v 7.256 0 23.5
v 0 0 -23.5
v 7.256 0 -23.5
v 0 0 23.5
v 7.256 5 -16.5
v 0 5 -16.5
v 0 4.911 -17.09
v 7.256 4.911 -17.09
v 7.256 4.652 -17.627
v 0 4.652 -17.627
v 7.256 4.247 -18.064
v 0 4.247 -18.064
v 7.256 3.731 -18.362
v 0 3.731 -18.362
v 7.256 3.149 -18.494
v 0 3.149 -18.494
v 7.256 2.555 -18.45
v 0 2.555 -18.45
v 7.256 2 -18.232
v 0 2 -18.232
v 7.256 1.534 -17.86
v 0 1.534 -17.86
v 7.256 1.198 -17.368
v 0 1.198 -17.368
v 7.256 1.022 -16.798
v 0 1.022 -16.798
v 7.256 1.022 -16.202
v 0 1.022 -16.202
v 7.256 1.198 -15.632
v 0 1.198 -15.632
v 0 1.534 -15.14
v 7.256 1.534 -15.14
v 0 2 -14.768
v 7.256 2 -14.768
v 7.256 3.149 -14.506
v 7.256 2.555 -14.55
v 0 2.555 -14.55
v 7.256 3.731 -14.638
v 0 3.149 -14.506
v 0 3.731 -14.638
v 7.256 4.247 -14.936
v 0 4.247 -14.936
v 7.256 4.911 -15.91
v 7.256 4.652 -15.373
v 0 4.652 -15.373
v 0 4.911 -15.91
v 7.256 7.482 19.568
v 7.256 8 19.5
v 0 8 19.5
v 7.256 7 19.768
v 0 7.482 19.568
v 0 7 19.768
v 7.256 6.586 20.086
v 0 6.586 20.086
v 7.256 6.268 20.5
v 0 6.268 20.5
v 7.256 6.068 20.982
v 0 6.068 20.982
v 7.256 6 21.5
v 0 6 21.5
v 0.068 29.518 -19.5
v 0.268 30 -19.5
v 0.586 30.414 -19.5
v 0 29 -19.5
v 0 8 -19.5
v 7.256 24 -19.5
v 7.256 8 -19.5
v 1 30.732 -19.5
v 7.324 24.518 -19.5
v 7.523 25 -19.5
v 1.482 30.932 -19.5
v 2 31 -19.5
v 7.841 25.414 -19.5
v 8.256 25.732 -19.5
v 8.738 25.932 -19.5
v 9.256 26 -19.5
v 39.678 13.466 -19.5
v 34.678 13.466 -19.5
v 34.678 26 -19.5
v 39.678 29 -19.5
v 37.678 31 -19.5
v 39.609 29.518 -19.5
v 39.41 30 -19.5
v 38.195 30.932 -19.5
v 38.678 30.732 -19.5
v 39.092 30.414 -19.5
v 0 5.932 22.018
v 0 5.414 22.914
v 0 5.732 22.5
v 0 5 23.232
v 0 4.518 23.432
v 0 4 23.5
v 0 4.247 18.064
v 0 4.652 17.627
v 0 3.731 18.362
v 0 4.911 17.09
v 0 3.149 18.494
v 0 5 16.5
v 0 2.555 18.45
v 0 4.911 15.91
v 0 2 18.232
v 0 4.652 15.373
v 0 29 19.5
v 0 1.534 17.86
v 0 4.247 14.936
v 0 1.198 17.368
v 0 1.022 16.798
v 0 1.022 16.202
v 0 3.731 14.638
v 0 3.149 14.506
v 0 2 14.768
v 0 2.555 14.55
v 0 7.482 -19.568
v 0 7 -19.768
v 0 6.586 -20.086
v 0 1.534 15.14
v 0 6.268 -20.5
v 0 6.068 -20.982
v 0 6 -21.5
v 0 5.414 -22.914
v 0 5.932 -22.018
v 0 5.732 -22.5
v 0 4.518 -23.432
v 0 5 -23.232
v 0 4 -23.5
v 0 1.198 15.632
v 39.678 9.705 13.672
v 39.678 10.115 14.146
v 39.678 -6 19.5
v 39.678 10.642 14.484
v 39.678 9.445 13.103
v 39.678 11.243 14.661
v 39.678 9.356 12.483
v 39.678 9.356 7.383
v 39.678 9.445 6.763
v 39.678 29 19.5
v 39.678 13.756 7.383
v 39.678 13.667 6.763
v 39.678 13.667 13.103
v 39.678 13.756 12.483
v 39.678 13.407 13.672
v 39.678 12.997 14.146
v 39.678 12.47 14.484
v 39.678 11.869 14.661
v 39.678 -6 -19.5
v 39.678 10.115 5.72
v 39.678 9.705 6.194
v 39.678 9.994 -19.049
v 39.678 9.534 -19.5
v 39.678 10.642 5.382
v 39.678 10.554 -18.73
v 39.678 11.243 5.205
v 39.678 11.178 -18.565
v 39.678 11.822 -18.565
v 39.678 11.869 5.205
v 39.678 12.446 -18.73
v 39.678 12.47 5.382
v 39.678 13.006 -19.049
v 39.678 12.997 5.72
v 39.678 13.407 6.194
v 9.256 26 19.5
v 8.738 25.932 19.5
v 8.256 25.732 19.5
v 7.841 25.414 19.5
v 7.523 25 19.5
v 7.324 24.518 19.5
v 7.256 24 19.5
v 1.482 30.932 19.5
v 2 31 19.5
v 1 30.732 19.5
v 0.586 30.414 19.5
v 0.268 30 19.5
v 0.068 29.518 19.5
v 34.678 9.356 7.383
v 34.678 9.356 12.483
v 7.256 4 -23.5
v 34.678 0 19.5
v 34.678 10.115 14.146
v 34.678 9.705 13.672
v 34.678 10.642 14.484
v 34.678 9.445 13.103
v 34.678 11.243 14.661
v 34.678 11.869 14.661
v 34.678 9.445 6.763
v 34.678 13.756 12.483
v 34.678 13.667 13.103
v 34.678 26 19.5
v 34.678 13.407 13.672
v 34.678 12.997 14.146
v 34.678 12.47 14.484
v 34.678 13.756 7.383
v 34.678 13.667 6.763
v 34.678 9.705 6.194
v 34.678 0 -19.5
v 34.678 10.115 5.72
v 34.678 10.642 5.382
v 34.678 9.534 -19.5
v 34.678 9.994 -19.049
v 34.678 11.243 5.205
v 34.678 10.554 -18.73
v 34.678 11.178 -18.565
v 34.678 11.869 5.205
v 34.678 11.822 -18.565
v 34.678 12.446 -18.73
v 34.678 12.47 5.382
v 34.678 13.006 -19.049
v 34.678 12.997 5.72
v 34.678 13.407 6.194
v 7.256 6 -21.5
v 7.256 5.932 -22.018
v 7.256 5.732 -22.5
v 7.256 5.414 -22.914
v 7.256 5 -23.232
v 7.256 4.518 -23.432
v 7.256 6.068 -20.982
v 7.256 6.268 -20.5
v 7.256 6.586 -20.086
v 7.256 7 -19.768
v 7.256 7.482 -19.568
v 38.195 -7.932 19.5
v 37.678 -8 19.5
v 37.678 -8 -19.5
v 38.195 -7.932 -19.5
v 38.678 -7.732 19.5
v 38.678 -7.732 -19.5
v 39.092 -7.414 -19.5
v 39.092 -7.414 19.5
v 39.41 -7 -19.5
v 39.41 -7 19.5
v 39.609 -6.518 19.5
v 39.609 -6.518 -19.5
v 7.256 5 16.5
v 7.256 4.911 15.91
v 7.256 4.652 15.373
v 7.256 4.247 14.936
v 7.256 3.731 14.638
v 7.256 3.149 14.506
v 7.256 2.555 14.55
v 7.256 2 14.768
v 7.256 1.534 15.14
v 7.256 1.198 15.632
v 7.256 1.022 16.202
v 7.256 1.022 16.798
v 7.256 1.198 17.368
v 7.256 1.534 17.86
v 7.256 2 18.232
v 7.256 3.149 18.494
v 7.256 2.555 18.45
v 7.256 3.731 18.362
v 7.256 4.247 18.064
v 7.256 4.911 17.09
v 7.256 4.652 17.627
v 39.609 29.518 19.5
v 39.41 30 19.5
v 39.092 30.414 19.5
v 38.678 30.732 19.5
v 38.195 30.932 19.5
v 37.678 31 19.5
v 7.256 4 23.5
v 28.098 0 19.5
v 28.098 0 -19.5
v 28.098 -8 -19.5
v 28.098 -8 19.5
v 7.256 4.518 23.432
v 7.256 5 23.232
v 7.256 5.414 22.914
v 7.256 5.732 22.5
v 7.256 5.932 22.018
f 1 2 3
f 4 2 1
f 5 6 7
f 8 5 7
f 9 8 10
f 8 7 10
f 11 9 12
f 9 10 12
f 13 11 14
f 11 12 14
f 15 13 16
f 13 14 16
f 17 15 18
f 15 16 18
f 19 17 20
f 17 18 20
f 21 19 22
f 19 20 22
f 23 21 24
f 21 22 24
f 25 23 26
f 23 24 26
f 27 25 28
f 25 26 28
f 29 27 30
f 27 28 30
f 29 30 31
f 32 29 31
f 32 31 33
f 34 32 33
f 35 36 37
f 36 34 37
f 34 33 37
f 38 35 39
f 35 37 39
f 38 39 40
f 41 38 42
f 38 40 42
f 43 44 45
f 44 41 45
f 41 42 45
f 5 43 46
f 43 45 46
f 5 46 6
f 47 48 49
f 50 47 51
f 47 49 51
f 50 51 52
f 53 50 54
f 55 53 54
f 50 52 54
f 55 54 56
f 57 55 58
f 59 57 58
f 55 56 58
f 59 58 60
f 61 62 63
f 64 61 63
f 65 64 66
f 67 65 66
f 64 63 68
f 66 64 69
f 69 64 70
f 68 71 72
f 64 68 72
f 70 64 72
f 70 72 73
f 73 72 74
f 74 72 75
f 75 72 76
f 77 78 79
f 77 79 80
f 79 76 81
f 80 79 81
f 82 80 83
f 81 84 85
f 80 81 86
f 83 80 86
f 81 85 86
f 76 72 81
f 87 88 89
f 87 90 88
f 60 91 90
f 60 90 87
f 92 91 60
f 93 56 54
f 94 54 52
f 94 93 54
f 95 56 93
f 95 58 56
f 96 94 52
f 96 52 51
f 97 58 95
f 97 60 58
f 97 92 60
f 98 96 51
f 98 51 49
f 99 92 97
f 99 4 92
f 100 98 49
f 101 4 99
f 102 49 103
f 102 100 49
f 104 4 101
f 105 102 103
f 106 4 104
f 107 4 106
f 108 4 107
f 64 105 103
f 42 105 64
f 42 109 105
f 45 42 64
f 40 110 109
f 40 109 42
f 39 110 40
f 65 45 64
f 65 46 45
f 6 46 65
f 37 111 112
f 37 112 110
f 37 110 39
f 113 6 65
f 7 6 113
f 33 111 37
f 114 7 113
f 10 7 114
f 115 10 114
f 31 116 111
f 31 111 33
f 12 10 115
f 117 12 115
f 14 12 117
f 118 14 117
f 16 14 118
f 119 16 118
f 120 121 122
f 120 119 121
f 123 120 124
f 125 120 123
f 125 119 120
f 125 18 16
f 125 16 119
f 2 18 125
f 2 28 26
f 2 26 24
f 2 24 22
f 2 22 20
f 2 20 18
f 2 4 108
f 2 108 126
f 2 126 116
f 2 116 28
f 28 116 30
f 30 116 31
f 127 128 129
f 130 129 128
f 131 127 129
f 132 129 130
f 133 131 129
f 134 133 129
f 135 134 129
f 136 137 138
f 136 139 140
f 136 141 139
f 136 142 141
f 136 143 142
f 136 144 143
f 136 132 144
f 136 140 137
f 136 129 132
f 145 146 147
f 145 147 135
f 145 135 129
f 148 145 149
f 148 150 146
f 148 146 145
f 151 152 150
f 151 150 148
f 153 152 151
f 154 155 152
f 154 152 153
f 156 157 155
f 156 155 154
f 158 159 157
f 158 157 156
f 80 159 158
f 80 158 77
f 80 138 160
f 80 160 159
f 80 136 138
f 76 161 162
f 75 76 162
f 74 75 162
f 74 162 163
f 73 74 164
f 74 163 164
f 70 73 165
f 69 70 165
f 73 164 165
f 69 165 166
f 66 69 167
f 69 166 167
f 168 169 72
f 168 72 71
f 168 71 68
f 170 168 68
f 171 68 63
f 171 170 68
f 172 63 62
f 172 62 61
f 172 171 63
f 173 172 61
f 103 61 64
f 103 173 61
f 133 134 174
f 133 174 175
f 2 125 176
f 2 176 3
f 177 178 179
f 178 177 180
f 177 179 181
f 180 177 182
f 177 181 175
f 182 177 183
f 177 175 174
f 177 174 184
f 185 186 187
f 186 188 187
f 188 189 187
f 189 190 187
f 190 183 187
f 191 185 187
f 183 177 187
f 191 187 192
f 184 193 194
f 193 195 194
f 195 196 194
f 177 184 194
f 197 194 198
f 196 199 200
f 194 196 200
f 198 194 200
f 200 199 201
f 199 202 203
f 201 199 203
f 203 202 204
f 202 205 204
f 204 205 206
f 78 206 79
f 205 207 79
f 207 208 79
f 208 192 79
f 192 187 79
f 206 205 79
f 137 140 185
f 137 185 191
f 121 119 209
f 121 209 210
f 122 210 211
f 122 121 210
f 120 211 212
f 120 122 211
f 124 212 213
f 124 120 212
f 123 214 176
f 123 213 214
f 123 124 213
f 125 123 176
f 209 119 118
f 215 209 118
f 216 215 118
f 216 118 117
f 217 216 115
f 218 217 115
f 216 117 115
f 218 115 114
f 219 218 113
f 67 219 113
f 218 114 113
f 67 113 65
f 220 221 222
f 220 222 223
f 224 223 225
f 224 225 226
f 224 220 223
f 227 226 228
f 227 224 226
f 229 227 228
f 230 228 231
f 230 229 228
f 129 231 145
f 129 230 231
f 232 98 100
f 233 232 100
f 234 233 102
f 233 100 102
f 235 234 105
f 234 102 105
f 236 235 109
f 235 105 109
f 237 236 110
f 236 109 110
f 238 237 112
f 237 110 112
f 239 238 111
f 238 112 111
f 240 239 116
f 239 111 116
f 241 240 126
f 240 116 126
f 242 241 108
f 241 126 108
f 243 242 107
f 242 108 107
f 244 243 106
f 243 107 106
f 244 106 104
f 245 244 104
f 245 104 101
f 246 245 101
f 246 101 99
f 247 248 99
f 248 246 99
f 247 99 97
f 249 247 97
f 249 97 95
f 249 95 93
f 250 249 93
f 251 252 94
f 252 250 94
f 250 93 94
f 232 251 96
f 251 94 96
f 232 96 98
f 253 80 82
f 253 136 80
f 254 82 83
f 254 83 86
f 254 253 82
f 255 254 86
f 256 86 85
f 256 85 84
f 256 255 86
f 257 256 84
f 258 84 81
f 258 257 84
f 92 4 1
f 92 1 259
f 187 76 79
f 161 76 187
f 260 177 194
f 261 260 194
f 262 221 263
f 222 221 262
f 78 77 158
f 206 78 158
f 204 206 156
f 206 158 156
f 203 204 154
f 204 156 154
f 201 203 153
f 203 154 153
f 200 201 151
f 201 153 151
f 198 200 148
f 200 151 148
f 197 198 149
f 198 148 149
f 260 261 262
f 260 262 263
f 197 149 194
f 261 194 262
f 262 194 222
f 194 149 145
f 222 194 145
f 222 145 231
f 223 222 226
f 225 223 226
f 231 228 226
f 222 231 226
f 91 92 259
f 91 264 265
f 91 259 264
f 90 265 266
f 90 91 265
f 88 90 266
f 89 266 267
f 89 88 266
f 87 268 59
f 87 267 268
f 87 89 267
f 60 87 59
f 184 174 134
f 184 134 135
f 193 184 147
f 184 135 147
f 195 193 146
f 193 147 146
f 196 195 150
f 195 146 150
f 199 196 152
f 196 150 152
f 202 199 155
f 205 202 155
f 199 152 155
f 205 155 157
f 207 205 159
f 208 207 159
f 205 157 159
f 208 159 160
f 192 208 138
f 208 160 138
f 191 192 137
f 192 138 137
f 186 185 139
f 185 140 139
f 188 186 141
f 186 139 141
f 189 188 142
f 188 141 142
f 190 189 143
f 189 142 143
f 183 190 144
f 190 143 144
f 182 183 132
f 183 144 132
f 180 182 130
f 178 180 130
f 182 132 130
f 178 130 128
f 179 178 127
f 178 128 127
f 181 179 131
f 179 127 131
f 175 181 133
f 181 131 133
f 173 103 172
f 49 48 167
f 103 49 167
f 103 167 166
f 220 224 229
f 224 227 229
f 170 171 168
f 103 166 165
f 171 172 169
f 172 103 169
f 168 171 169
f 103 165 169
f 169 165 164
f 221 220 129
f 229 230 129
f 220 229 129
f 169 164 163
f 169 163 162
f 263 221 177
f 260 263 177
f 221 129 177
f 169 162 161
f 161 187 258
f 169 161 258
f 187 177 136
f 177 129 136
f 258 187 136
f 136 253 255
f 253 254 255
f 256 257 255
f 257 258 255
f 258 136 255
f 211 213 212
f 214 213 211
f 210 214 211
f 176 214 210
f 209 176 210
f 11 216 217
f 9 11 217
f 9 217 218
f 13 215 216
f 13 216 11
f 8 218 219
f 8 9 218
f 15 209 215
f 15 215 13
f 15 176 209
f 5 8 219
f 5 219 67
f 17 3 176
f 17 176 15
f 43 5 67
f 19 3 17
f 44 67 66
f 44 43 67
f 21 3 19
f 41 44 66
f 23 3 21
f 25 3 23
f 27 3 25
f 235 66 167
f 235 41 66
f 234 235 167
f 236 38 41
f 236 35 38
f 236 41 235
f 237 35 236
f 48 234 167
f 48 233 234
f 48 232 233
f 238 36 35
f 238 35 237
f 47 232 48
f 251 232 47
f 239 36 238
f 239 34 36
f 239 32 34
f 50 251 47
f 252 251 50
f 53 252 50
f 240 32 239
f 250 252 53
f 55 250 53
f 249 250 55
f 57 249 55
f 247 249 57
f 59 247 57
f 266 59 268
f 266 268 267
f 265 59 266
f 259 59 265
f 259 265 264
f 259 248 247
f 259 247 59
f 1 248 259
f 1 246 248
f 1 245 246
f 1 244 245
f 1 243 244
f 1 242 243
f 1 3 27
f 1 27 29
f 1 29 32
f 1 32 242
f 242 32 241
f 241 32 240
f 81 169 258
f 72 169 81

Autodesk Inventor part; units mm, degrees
ref_plane "YZ Plane" through (0, 0, 0) normal (1, 0, 0) x (0, 1, 0)
ref_plane "XZ Plane" through (0, 0, 0) normal (0, 1, 0) x (-1, 0, 0)
ref_plane "XY Plane" through (0, 0, 0) normal (0, 0, 1) x (1, 0, 0)
sketch "Sketch1" plane through (0, 0, 0) normal (1, 0, 0) x (0, 1, 0)
  line L0 (0, 0) -> (0, 23.5)
  line L1 (0, 23.5) -> (6, 23.5)
  line L2 (6, 23.5) -> (6, -23.5)
  line L3 (6, -23.5) -> (0, -23.5)
  line L4 (0, -23.5) -> (0, 0)
  line L5 (6, 23.5) -> (6, 21.5)
  line L6 (6, 21.5) -> (4, 21.5)
  circle A0 centre (4, 21.5) radius 2
  line L7 (6, -23.5) -> (6, -21.5)
  line L8 (6, -21.5) -> (4, -21.5)
  circle A1 centre (4, -21.5) radius 2
  line L9 (6, -23.5) -> (6, -16.5)
  line L10 (6, -16.5) -> (3, -16.5)
  line L11 (6, 23.5) -> (6, 16.5)
  line L12 (6, 16.5) -> (3, 16.5)
  circle A2 centre (3, 16.5) radius 2
  circle A3 centre (3, -16.5) radius 2
  point P0 (4, 23.5)
  point P1 (4, -23.5)
  dimension "d0" = 23.5
  dimension "d1" = 6
  dimension "d2" = 47
  dimension "d3" = 6
  dimension "d4" = 2
  dimension "d5" = 2
  dimension "d6" = 4
  dimension "d7" = 2
  dimension "d8" = 2
  dimension "d9" = 4
  dimension "d10" = 7
  dimension "d11" = 3
  dimension "d12" = 7
  dimension "d13" = 3
  dimension "d14" = 4
  dimension "d15" = 4
extrude "Extrusion1" add sketch "Sketch1" along normal blind 7.2555 contours L0 L1 A0 L2 A1 L3 L4 | A0 | A1
sketch "Sketch2" plane through (0, 6, 21.5) normal (0, 1, 0) x (1, 0, 0)
  line L0 (7.2555, -2) -> (7.2555, 0) projected
  line L1 (0, 0) -> (7.2555, 0) projected
  line L2 (7.2555, 0) -> (0, 0)
  line L3 (0, 0) -> (0, 43)
  line L4 (0, -2) -> (0, 45) projected
  line L5 (0, 43) -> (7.2555, 43)
  line L6 (7.2555, 43) -> (7.2555, 0)
  point P0 (0, 21.5)
  dimension "d18" = 7.2555
  dimension "d19" = 43
  dimension "d20" = 7.2555
extrude "Extrusion2" add sketch "Sketch2" along normal blind 25
sketch "Sketch3" plane through (0, 0, 0) normal (-1, 0, 0) x (0, 0, 1)
  arc A0 (23.5, 4) -> (21.5, 6) centre (21.5, 4) ccw projected
  line L0 (21.5, 6) -> (21.5, 8)
  line L1 (21.5, 6) -> (21.5, 31) projected
  circle A1 centre (21.5, 8) radius 2
  line L2 (19.5, 8) -> (19.5, 31)
  line L3 (21.5, 31) -> (-21.5, 31) projected
  line L4 (19.5, 31) -> (21.5, 31)
  line L5 (21.5, 31) -> (21.5, 10)
  line L6 (-21.5, 6) -> (-21.5, 31) projected
  line L7 (-21.5, 6) -> (-21.5, 8)
  circle A2 centre (-21.5, 8) radius 2
  line L8 (-19.5, 8) -> (-19.5, 31)
  line L9 (-19.5, 31) -> (-21.5, 31)
  line L10 (-21.5, 31) -> (-21.5, 10)
  point P0 (0, 0)
  dimension "d23" = 2
  dimension "d24" = 4
  dimension "d25" = 23
  dimension "d26" = 2
  dimension "d27" = 4
  dimension "d28" = 23
extrude "Extrusion3" cut sketch "Sketch3" against normal blind 7.2555 contours A1 L1 L0 | L8 A2 L6 L3 | L2 L3 L1 A1 | A2 L6 picked at (20.5631, 8.9369) picked at (-20.5631, 7.0631)
sketch "Sketch4" plane through (7.2555, 0, 0) normal (1, 0, 0) x (0, 0, -1)
  line L0 (-19.5, 31) -> (19.5, 31) projected
  line L1 (-19.5, 31) -> (-19.5, 26)
  line L2 (-19.5, 8) -> (-19.5, 31) projected
  line L3 (-19.5, 26) -> (19.5, 26)
  line L4 (19.5, 26) -> (19.5, 31)
  line L5 (-19.5, 31) -> (19.5, 31)
  point P0 (0, 0)
  dimension "d31" = 5
  dimension "d32" = 39
extrude "Extrusion4" add sketch "Sketch4" along normal blind 27.422
sketch "Sketch5" plane through (0, 8, 19.5) normal (0, 0, 1) x (1, 0, 0)
  line L0 (0, 0) -> (0, 23) projected
  line L1 (0, 23) -> (0, 21)
  line L2 (0, 21) -> (2, 21)
  circle A0 centre (2, 21) radius 2
  line L3 (0, 23) -> (2, 23)
  line L4 (0, 23) -> (34.6775, 23) projected
  line L5 (7.2555, 18) -> (34.6775, 18) projected
  line L6 (7.2555, 18) -> (7.2555, 16)
  line L7 (7.2555, 16) -> (9.2555, 16)
  circle A1 centre (9.2555, 16) radius 2
  line L8 (7.2555, 18) -> (9.2555, 18)
  point P0 (0, -8)
  point P1 (7.2555, 16)
  dimension "d37" = 4
  dimension "d40" = 4
  dimension "d35" = 2
  dimension "d36" = 2
  dimension "d38" = 2
  dimension "d39" = 2
extrude "Extrusion5" cut sketch "Sketch5" against normal blind 39 contours L0 L3 A0 | L5 A1 L6
sketch "Sketch6" plane through (0, 8, 19.5) normal (0, 0, 1) x (1, 0, 0)
  line L0 (7.2555, 18) -> (7.2555, 0) projected
  line L1 (7.2555, 18) -> (7.2555, 16)
  line L2 (7.2555, 16) -> (9.2555, 16)
  circle A0 centre (9.2555, 16) radius 2
  line L3 (7.2555, 18) -> (34.6775, 18) projected
  line L4 (7.2555, 18) -> (9.2555, 18)
  point P0 (0, -8)
  point P1 (7.2555, 16)
  dimension "d45" = 4
  dimension "d43" = 2
  dimension "d44" = 2
extrude "Extrusion6" add sketch "Sketch6" against normal blind 39 contours L3 A0 L0
sketch "Sketch7" plane through (34.6775, 0, 0) normal (1, 0, 0) x (0, 0, -1)
  line L0 (-19.5, 31) -> (-19.5, 26) projected
  line L1 (19.5, 26) -> (19.5, 31) projected
  line L2 (-19.5, 31) -> (19.5, 31)
  line L3 (19.5, 31) -> (19.5, 26)
  line L4 (19.5, 26) -> (-19.5, 26)
  line L5 (-19.5, 26) -> (-19.5, 31)
  point P0 (0, 0)
extrude "Extrusion7" add sketch "Sketch7" along normal blind 5
sketch "Sketch8" plane through (0, 8, 19.5) normal (0, 0, 1) x (1, 0, 0)
  line L0 (39.6775, 23) -> (2, 23) projected
  line L1 (39.6775, 23) -> (37.6775, 23)
  line L2 (37.6775, 23) -> (37.6775, 21)
  circle A0 centre (37.6775, 21) radius 2
  line L3 (39.6775, 23) -> (39.6775, 21)
  point P0 (0, -8)
  dimension "d52" = 4
  dimension "d50" = 2
  dimension "d51" = 2
extrude "Extrusion8" cut sketch "Sketch8" against normal blind 39 contours L3 A0 L0
sketch "Sketch9" plane through (9.2555, 26, -19.5) normal (0, -1, 0) x (1, 0, 0)
  line L0 (30.422, 39) -> (30.422, 0) projected
  line L1 (30.422, 39) -> (25.422, 39)
  line L2 (0, 39) -> (30.422, 39) projected
  line L3 (25.422, 39) -> (25.422, 0)
  line L4 (25.422, 0) -> (30.422, 0)
  line L5 (30.422, 0) -> (30.422, 39)
  point P0 (-9.2555, 19.5)
  dimension "d55" = 5
  dimension "d56" = 39
extrude "Extrusion9" add sketch "Sketch9" along normal blind 34
sketch "Sketch10" plane through (39.6775, 0, 0) normal (1, 0, 0) x (0, 0, -1)
  line L0 (-19.5, 31) -> (-19.5, 29) projected
  line L1 (-19.5, 29) -> (-19.5, 26)
  line L2 (-19.5, 29) -> (-19.5, -8) projected
  line L3 (-19.5, 26) -> (19.5, 26)
  line L4 (19.5, 26) -> (19.5, 29)
  line L5 (19.5, 29) -> (-19.5, 29)
  line L6 (-19.5, 26) -> (-9.933, 26)
  line L7 (-9.933, 26) -> (-9.933, 13.756)
  line L8 (-9.933, 13.756) -> (-7.383, 13.756)
  line L9 (-7.383, 13.756) -> (-7.383, 11.556)
  line L10 (-7.383, 11.556) -> (-7.383, 9.356)
  line L11 (-7.383, 9.356) -> (-12.483, 9.356)
  line L12 (-12.483, 9.356) -> (-12.483, 11.556)
  line L13 (-12.483, 11.556) -> (-12.483, 13.756)
  line L14 (-12.483, 13.756) -> (-9.933, 13.756)
  circle A0 centre (-7.383, 11.556) radius 2.2
  circle A1 centre (-12.483, 11.556) radius 2.2
  line L15 (19.5, 26) -> (21.044, 26)
  line L16 (21.044, 26) -> (21.044, 11.5)
  circle A2 centre (21.044, 11.5) radius 2.5
  point P0 (0, 0)
  dimension "d59" = 3
  dimension "d60" = 39
  dimension "d61" = 9.567
  dimension "d62" = 12.244
  dimension "d63" = 2.55
  dimension "d64" = 2.2
  dimension "d65" = 2.2
  dimension "d66" = 5.1
  dimension "d67" = 2.2
  dimension "d68" = 2.2
  dimension "d69" = 4.4
  dimension "d70" = 4.4
  dimension "d71" = 1.544
  dimension "d72" = 14.5
  dimension "d73" = 5
extrude "Extrusion10" cut sketch "Sketch10" against normal blind 5 contours A2 | L8 A0 L11 A1 L14 | A0 L10 L9 | L9 L10 A0 | A1 L12 L13 | L13 L12 A1
sketch "Sketch11" plane through (34.6775, 26, -19.5) normal (-1, 0, 0) x (0, 0, 1)
  line L0 (39, -34) -> (0, -34) projected
  line L1 (39, -34) -> (39, -26)
  line L2 (39, 3) -> (39, -34) projected
  line L3 (39, -26) -> (0, -26)
  line L4 (0, -26) -> (0, -34)
  line L5 (0, -34) -> (39, -34)
  point P0 (19.5, -26)
  dimension "d76" = 8
  dimension "d77" = 39
extrude "Extrusion11" add sketch "Sketch11" along normal blind 6.58
sketch "Sketch12" plane through (0, 8, 19.5) normal (0, 0, 1) x (1, 0, 0)
  line L0 (39.6775, 21) -> (39.6775, -16) projected
  line L1 (39.6775, -16) -> (37.6775, -16)
  line L2 (39.6775, -16) -> (28.0975, -16) projected
  line L3 (37.6775, -16) -> (37.6775, -14)
  circle A0 centre (37.6775, -14) radius 2
  line L4 (39.6775, -16) -> (39.6775, -14)
  point P0 (0, -8)
  point P1 (37.6775, -16)
  dimension "d82" = 4
  dimension "d80" = 2
  dimension "d81" = 2
extrude "Extrusion12" cut sketch "Sketch12" against normal blind 39 contours L0 L1 A0
properties part number "camera_lock"
